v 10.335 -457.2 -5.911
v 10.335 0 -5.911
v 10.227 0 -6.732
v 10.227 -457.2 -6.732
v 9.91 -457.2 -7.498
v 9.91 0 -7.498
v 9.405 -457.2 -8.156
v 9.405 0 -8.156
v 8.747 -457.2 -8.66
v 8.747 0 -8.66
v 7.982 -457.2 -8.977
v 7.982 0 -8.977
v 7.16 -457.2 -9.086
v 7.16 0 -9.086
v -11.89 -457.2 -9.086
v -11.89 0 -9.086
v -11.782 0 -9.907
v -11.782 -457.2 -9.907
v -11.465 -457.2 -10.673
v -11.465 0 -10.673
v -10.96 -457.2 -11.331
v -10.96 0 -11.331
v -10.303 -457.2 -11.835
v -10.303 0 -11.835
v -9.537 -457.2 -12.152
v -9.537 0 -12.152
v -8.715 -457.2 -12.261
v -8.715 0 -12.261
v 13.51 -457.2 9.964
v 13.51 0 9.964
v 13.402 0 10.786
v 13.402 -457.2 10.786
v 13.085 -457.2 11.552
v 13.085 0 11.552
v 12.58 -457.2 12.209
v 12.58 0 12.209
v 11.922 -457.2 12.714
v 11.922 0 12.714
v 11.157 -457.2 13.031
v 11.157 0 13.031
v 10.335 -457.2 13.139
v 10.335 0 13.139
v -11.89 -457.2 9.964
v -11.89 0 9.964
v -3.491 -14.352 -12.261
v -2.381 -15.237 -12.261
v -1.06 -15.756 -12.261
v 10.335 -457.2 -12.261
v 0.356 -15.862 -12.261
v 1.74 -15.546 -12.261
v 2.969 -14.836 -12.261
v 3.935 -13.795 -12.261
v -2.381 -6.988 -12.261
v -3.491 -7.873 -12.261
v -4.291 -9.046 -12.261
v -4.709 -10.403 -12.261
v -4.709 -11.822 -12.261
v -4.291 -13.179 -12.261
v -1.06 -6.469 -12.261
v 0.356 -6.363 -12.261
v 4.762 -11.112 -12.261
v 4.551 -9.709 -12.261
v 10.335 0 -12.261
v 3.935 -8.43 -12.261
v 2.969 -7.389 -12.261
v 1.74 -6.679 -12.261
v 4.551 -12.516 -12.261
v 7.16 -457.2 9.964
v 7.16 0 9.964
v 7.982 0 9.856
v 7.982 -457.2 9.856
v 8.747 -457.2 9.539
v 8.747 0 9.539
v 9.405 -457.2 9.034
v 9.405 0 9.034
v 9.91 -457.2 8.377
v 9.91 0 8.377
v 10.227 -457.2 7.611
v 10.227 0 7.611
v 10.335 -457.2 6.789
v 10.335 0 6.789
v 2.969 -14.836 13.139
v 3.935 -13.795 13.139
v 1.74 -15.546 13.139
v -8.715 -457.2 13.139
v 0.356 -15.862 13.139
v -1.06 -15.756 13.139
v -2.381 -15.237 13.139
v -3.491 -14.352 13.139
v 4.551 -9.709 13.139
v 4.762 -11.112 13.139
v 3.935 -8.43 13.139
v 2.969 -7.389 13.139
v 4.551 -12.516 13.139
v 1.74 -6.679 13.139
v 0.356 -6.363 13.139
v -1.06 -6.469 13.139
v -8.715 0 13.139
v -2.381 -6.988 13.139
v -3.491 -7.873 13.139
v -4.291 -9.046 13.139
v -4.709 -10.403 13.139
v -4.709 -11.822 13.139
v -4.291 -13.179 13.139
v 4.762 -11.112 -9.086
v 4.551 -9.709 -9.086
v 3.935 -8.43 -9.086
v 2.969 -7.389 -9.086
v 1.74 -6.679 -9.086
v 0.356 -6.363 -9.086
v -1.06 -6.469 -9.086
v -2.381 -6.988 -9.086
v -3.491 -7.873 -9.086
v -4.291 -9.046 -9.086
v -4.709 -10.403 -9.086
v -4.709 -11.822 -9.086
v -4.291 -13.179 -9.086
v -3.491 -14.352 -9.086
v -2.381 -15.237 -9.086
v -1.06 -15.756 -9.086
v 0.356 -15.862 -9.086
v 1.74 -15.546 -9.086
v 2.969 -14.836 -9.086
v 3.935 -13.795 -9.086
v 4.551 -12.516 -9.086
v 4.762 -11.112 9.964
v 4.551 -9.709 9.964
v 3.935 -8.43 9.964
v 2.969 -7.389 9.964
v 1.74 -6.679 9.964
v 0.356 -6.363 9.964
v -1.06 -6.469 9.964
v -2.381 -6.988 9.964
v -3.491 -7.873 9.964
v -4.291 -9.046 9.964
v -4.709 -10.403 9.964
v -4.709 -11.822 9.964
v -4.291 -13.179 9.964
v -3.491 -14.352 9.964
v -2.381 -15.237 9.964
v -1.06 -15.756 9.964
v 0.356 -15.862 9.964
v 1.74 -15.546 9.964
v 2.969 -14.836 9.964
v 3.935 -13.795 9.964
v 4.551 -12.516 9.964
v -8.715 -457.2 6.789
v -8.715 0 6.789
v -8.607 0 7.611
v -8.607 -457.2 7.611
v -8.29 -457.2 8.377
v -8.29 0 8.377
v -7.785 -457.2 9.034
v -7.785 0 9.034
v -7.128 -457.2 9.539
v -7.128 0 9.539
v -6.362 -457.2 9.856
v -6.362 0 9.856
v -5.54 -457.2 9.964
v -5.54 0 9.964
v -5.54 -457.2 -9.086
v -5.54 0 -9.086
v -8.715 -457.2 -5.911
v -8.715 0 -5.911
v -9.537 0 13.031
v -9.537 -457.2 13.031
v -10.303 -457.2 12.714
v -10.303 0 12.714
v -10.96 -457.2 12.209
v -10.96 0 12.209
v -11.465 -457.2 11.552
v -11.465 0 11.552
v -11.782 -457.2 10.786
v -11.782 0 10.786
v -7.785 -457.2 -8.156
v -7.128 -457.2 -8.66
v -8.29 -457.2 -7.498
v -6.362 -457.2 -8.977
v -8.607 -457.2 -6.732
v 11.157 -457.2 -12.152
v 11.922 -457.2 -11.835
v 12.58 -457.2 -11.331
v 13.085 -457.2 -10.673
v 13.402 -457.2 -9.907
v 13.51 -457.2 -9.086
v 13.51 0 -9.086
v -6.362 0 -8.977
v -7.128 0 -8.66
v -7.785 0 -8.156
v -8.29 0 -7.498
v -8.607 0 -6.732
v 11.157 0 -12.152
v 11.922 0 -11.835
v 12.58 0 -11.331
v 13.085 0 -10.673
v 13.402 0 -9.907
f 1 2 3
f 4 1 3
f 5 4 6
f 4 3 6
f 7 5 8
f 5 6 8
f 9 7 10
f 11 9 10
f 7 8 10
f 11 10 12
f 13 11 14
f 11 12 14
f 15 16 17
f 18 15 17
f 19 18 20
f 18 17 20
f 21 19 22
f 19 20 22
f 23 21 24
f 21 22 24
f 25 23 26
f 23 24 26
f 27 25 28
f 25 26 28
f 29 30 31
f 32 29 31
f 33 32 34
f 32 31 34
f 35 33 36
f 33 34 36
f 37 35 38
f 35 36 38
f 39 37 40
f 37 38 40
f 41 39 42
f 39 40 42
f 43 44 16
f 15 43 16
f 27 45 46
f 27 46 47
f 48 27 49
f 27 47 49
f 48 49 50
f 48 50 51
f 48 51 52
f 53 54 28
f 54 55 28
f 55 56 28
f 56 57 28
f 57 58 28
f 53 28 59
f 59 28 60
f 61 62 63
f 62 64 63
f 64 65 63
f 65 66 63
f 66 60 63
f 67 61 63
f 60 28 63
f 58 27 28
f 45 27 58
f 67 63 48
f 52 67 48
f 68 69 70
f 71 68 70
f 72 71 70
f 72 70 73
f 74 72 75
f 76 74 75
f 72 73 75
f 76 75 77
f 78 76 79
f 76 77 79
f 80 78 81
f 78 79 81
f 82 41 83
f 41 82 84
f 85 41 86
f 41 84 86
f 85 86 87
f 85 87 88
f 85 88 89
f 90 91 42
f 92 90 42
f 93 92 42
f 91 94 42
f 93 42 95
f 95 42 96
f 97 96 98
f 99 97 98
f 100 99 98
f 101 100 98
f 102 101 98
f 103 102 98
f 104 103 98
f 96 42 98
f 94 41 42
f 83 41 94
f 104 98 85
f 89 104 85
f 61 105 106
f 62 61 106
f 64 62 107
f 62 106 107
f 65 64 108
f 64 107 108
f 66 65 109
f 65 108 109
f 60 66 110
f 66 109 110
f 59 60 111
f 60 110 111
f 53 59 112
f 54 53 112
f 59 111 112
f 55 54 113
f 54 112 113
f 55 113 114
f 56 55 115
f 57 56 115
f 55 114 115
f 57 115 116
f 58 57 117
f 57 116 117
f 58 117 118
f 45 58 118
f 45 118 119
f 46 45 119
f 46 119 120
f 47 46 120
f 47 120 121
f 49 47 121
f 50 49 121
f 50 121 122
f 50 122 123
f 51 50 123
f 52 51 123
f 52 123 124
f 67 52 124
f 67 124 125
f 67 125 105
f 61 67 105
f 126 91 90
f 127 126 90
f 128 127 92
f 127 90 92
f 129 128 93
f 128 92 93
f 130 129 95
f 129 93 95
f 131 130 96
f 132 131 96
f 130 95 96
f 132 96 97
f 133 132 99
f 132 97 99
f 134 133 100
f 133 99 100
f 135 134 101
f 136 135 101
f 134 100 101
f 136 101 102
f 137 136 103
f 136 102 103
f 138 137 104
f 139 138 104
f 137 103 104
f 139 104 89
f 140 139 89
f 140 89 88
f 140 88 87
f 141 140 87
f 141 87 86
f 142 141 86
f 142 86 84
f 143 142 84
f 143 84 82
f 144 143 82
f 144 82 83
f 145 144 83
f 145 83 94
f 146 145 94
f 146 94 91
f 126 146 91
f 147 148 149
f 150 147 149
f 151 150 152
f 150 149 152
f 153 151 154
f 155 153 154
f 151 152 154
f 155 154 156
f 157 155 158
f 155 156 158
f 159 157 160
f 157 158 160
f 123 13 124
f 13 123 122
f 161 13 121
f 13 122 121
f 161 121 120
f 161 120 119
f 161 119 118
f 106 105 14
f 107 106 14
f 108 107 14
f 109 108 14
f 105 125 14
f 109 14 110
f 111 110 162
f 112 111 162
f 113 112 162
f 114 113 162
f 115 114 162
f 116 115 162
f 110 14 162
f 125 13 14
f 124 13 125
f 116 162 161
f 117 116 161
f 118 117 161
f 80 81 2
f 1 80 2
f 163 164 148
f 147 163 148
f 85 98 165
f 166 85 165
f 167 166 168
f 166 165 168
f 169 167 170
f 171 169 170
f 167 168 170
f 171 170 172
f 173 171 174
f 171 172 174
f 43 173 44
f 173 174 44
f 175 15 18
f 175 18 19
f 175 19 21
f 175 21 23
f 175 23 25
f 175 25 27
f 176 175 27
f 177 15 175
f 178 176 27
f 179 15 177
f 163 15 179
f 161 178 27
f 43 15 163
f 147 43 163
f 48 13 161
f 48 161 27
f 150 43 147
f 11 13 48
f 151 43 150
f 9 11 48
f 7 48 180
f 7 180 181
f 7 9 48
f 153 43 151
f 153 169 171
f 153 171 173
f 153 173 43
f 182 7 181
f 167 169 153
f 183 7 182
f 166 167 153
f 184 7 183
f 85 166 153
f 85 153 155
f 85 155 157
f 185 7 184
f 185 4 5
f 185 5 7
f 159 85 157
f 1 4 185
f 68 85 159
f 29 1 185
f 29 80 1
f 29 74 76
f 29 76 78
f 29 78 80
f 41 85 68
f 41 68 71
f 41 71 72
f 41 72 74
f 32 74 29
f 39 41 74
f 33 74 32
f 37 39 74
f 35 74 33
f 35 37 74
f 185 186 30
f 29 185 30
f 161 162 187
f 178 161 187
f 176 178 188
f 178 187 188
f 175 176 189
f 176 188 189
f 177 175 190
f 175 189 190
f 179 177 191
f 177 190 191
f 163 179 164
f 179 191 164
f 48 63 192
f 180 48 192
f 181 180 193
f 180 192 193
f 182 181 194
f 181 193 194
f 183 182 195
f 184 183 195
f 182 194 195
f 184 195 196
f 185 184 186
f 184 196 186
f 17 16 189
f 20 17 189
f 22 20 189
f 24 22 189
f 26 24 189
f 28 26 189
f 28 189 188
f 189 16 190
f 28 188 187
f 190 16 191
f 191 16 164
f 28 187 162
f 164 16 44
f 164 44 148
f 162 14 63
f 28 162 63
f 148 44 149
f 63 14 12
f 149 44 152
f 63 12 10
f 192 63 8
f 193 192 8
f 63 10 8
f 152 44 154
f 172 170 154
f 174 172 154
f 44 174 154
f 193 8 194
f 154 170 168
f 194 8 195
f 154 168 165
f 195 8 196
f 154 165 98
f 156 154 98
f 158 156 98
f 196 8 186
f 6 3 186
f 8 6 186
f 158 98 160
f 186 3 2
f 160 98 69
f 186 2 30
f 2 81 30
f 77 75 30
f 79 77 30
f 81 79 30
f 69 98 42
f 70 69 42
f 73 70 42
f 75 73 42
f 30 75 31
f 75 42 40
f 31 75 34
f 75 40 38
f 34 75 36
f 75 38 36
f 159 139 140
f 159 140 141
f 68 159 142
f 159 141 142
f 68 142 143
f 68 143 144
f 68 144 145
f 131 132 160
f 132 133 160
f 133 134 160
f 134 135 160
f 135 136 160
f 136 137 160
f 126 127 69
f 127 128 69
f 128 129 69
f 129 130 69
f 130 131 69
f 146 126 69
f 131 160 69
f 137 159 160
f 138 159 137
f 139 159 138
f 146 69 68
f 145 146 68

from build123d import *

# Parameters (mm, degrees)
F1_DEPTH = 457.2
F2_R     = 4.7625
F3_DEPTH = 25.4


with BuildPart() as f1:
    # F0 (on Front) → F1 (new body)
    with BuildSketch(Plane.XZ):
        with BuildLine():
            Line((-8.715044, -12.260614), (10.334956, -12.260614))
            ThreePointArc((10.334956, -12.260614), (12.58002, -11.330678), (13.509956, -9.085614))
            Line((13.509956, -9.085614), (13.509956, 9.964386))
            ThreePointArc((13.509956, 9.964386), (12.58002, 12.20945), (10.334956, 13.139386))
            Line((10.334956, 13.139386), (-8.715044, 13.139386))
            ThreePointArc((-8.715044, 13.139386), (-10.960108, 12.20945), (-11.890044, 9.964386))
            Line((-11.890044, 9.964386), (-11.890044, -9.085614))
            ThreePointArc((-11.890044, -9.085614), (-10.960108, -11.330678), (-8.715044, -12.260614))
        make_face()
        with BuildLine():
            ThreePointArc((10.334956, -5.910614), (9.40502, -8.155678), (7.159956, -9.085614))
            Line((7.159956, -9.085614), (-5.540044, -9.085614))
            ThreePointArc((-5.540044, -9.085614), (-7.785108, -8.155678), (-8.715044, -5.910614))
            Line((-8.715044, -5.910614), (-8.715044, 6.789386))
            ThreePointArc((-8.715044, 6.789386), (-7.785108, 9.03445), (-5.540044, 9.964386))
            Line((-5.540044, 9.964386), (7.159956, 9.964386))
            ThreePointArc((7.159956, 9.964386), (9.40502, 9.03445), (10.334956, 6.789386))
            Line((10.334956, 6.789386), (10.334956, -5.910614))
        make_face(mode=Mode.SUBTRACT)
    extrude(amount=F1_DEPTH)

    # F2 (on face) → F3 (cut)
    with BuildSketch(Plane.XY.offset(13.139386)):
        with Locations((0, -11.1125)):
            Circle(F2_R)
    extrude(amount=-F3_DEPTH, mode=Mode.SUBTRACT)


solid = f1.part
